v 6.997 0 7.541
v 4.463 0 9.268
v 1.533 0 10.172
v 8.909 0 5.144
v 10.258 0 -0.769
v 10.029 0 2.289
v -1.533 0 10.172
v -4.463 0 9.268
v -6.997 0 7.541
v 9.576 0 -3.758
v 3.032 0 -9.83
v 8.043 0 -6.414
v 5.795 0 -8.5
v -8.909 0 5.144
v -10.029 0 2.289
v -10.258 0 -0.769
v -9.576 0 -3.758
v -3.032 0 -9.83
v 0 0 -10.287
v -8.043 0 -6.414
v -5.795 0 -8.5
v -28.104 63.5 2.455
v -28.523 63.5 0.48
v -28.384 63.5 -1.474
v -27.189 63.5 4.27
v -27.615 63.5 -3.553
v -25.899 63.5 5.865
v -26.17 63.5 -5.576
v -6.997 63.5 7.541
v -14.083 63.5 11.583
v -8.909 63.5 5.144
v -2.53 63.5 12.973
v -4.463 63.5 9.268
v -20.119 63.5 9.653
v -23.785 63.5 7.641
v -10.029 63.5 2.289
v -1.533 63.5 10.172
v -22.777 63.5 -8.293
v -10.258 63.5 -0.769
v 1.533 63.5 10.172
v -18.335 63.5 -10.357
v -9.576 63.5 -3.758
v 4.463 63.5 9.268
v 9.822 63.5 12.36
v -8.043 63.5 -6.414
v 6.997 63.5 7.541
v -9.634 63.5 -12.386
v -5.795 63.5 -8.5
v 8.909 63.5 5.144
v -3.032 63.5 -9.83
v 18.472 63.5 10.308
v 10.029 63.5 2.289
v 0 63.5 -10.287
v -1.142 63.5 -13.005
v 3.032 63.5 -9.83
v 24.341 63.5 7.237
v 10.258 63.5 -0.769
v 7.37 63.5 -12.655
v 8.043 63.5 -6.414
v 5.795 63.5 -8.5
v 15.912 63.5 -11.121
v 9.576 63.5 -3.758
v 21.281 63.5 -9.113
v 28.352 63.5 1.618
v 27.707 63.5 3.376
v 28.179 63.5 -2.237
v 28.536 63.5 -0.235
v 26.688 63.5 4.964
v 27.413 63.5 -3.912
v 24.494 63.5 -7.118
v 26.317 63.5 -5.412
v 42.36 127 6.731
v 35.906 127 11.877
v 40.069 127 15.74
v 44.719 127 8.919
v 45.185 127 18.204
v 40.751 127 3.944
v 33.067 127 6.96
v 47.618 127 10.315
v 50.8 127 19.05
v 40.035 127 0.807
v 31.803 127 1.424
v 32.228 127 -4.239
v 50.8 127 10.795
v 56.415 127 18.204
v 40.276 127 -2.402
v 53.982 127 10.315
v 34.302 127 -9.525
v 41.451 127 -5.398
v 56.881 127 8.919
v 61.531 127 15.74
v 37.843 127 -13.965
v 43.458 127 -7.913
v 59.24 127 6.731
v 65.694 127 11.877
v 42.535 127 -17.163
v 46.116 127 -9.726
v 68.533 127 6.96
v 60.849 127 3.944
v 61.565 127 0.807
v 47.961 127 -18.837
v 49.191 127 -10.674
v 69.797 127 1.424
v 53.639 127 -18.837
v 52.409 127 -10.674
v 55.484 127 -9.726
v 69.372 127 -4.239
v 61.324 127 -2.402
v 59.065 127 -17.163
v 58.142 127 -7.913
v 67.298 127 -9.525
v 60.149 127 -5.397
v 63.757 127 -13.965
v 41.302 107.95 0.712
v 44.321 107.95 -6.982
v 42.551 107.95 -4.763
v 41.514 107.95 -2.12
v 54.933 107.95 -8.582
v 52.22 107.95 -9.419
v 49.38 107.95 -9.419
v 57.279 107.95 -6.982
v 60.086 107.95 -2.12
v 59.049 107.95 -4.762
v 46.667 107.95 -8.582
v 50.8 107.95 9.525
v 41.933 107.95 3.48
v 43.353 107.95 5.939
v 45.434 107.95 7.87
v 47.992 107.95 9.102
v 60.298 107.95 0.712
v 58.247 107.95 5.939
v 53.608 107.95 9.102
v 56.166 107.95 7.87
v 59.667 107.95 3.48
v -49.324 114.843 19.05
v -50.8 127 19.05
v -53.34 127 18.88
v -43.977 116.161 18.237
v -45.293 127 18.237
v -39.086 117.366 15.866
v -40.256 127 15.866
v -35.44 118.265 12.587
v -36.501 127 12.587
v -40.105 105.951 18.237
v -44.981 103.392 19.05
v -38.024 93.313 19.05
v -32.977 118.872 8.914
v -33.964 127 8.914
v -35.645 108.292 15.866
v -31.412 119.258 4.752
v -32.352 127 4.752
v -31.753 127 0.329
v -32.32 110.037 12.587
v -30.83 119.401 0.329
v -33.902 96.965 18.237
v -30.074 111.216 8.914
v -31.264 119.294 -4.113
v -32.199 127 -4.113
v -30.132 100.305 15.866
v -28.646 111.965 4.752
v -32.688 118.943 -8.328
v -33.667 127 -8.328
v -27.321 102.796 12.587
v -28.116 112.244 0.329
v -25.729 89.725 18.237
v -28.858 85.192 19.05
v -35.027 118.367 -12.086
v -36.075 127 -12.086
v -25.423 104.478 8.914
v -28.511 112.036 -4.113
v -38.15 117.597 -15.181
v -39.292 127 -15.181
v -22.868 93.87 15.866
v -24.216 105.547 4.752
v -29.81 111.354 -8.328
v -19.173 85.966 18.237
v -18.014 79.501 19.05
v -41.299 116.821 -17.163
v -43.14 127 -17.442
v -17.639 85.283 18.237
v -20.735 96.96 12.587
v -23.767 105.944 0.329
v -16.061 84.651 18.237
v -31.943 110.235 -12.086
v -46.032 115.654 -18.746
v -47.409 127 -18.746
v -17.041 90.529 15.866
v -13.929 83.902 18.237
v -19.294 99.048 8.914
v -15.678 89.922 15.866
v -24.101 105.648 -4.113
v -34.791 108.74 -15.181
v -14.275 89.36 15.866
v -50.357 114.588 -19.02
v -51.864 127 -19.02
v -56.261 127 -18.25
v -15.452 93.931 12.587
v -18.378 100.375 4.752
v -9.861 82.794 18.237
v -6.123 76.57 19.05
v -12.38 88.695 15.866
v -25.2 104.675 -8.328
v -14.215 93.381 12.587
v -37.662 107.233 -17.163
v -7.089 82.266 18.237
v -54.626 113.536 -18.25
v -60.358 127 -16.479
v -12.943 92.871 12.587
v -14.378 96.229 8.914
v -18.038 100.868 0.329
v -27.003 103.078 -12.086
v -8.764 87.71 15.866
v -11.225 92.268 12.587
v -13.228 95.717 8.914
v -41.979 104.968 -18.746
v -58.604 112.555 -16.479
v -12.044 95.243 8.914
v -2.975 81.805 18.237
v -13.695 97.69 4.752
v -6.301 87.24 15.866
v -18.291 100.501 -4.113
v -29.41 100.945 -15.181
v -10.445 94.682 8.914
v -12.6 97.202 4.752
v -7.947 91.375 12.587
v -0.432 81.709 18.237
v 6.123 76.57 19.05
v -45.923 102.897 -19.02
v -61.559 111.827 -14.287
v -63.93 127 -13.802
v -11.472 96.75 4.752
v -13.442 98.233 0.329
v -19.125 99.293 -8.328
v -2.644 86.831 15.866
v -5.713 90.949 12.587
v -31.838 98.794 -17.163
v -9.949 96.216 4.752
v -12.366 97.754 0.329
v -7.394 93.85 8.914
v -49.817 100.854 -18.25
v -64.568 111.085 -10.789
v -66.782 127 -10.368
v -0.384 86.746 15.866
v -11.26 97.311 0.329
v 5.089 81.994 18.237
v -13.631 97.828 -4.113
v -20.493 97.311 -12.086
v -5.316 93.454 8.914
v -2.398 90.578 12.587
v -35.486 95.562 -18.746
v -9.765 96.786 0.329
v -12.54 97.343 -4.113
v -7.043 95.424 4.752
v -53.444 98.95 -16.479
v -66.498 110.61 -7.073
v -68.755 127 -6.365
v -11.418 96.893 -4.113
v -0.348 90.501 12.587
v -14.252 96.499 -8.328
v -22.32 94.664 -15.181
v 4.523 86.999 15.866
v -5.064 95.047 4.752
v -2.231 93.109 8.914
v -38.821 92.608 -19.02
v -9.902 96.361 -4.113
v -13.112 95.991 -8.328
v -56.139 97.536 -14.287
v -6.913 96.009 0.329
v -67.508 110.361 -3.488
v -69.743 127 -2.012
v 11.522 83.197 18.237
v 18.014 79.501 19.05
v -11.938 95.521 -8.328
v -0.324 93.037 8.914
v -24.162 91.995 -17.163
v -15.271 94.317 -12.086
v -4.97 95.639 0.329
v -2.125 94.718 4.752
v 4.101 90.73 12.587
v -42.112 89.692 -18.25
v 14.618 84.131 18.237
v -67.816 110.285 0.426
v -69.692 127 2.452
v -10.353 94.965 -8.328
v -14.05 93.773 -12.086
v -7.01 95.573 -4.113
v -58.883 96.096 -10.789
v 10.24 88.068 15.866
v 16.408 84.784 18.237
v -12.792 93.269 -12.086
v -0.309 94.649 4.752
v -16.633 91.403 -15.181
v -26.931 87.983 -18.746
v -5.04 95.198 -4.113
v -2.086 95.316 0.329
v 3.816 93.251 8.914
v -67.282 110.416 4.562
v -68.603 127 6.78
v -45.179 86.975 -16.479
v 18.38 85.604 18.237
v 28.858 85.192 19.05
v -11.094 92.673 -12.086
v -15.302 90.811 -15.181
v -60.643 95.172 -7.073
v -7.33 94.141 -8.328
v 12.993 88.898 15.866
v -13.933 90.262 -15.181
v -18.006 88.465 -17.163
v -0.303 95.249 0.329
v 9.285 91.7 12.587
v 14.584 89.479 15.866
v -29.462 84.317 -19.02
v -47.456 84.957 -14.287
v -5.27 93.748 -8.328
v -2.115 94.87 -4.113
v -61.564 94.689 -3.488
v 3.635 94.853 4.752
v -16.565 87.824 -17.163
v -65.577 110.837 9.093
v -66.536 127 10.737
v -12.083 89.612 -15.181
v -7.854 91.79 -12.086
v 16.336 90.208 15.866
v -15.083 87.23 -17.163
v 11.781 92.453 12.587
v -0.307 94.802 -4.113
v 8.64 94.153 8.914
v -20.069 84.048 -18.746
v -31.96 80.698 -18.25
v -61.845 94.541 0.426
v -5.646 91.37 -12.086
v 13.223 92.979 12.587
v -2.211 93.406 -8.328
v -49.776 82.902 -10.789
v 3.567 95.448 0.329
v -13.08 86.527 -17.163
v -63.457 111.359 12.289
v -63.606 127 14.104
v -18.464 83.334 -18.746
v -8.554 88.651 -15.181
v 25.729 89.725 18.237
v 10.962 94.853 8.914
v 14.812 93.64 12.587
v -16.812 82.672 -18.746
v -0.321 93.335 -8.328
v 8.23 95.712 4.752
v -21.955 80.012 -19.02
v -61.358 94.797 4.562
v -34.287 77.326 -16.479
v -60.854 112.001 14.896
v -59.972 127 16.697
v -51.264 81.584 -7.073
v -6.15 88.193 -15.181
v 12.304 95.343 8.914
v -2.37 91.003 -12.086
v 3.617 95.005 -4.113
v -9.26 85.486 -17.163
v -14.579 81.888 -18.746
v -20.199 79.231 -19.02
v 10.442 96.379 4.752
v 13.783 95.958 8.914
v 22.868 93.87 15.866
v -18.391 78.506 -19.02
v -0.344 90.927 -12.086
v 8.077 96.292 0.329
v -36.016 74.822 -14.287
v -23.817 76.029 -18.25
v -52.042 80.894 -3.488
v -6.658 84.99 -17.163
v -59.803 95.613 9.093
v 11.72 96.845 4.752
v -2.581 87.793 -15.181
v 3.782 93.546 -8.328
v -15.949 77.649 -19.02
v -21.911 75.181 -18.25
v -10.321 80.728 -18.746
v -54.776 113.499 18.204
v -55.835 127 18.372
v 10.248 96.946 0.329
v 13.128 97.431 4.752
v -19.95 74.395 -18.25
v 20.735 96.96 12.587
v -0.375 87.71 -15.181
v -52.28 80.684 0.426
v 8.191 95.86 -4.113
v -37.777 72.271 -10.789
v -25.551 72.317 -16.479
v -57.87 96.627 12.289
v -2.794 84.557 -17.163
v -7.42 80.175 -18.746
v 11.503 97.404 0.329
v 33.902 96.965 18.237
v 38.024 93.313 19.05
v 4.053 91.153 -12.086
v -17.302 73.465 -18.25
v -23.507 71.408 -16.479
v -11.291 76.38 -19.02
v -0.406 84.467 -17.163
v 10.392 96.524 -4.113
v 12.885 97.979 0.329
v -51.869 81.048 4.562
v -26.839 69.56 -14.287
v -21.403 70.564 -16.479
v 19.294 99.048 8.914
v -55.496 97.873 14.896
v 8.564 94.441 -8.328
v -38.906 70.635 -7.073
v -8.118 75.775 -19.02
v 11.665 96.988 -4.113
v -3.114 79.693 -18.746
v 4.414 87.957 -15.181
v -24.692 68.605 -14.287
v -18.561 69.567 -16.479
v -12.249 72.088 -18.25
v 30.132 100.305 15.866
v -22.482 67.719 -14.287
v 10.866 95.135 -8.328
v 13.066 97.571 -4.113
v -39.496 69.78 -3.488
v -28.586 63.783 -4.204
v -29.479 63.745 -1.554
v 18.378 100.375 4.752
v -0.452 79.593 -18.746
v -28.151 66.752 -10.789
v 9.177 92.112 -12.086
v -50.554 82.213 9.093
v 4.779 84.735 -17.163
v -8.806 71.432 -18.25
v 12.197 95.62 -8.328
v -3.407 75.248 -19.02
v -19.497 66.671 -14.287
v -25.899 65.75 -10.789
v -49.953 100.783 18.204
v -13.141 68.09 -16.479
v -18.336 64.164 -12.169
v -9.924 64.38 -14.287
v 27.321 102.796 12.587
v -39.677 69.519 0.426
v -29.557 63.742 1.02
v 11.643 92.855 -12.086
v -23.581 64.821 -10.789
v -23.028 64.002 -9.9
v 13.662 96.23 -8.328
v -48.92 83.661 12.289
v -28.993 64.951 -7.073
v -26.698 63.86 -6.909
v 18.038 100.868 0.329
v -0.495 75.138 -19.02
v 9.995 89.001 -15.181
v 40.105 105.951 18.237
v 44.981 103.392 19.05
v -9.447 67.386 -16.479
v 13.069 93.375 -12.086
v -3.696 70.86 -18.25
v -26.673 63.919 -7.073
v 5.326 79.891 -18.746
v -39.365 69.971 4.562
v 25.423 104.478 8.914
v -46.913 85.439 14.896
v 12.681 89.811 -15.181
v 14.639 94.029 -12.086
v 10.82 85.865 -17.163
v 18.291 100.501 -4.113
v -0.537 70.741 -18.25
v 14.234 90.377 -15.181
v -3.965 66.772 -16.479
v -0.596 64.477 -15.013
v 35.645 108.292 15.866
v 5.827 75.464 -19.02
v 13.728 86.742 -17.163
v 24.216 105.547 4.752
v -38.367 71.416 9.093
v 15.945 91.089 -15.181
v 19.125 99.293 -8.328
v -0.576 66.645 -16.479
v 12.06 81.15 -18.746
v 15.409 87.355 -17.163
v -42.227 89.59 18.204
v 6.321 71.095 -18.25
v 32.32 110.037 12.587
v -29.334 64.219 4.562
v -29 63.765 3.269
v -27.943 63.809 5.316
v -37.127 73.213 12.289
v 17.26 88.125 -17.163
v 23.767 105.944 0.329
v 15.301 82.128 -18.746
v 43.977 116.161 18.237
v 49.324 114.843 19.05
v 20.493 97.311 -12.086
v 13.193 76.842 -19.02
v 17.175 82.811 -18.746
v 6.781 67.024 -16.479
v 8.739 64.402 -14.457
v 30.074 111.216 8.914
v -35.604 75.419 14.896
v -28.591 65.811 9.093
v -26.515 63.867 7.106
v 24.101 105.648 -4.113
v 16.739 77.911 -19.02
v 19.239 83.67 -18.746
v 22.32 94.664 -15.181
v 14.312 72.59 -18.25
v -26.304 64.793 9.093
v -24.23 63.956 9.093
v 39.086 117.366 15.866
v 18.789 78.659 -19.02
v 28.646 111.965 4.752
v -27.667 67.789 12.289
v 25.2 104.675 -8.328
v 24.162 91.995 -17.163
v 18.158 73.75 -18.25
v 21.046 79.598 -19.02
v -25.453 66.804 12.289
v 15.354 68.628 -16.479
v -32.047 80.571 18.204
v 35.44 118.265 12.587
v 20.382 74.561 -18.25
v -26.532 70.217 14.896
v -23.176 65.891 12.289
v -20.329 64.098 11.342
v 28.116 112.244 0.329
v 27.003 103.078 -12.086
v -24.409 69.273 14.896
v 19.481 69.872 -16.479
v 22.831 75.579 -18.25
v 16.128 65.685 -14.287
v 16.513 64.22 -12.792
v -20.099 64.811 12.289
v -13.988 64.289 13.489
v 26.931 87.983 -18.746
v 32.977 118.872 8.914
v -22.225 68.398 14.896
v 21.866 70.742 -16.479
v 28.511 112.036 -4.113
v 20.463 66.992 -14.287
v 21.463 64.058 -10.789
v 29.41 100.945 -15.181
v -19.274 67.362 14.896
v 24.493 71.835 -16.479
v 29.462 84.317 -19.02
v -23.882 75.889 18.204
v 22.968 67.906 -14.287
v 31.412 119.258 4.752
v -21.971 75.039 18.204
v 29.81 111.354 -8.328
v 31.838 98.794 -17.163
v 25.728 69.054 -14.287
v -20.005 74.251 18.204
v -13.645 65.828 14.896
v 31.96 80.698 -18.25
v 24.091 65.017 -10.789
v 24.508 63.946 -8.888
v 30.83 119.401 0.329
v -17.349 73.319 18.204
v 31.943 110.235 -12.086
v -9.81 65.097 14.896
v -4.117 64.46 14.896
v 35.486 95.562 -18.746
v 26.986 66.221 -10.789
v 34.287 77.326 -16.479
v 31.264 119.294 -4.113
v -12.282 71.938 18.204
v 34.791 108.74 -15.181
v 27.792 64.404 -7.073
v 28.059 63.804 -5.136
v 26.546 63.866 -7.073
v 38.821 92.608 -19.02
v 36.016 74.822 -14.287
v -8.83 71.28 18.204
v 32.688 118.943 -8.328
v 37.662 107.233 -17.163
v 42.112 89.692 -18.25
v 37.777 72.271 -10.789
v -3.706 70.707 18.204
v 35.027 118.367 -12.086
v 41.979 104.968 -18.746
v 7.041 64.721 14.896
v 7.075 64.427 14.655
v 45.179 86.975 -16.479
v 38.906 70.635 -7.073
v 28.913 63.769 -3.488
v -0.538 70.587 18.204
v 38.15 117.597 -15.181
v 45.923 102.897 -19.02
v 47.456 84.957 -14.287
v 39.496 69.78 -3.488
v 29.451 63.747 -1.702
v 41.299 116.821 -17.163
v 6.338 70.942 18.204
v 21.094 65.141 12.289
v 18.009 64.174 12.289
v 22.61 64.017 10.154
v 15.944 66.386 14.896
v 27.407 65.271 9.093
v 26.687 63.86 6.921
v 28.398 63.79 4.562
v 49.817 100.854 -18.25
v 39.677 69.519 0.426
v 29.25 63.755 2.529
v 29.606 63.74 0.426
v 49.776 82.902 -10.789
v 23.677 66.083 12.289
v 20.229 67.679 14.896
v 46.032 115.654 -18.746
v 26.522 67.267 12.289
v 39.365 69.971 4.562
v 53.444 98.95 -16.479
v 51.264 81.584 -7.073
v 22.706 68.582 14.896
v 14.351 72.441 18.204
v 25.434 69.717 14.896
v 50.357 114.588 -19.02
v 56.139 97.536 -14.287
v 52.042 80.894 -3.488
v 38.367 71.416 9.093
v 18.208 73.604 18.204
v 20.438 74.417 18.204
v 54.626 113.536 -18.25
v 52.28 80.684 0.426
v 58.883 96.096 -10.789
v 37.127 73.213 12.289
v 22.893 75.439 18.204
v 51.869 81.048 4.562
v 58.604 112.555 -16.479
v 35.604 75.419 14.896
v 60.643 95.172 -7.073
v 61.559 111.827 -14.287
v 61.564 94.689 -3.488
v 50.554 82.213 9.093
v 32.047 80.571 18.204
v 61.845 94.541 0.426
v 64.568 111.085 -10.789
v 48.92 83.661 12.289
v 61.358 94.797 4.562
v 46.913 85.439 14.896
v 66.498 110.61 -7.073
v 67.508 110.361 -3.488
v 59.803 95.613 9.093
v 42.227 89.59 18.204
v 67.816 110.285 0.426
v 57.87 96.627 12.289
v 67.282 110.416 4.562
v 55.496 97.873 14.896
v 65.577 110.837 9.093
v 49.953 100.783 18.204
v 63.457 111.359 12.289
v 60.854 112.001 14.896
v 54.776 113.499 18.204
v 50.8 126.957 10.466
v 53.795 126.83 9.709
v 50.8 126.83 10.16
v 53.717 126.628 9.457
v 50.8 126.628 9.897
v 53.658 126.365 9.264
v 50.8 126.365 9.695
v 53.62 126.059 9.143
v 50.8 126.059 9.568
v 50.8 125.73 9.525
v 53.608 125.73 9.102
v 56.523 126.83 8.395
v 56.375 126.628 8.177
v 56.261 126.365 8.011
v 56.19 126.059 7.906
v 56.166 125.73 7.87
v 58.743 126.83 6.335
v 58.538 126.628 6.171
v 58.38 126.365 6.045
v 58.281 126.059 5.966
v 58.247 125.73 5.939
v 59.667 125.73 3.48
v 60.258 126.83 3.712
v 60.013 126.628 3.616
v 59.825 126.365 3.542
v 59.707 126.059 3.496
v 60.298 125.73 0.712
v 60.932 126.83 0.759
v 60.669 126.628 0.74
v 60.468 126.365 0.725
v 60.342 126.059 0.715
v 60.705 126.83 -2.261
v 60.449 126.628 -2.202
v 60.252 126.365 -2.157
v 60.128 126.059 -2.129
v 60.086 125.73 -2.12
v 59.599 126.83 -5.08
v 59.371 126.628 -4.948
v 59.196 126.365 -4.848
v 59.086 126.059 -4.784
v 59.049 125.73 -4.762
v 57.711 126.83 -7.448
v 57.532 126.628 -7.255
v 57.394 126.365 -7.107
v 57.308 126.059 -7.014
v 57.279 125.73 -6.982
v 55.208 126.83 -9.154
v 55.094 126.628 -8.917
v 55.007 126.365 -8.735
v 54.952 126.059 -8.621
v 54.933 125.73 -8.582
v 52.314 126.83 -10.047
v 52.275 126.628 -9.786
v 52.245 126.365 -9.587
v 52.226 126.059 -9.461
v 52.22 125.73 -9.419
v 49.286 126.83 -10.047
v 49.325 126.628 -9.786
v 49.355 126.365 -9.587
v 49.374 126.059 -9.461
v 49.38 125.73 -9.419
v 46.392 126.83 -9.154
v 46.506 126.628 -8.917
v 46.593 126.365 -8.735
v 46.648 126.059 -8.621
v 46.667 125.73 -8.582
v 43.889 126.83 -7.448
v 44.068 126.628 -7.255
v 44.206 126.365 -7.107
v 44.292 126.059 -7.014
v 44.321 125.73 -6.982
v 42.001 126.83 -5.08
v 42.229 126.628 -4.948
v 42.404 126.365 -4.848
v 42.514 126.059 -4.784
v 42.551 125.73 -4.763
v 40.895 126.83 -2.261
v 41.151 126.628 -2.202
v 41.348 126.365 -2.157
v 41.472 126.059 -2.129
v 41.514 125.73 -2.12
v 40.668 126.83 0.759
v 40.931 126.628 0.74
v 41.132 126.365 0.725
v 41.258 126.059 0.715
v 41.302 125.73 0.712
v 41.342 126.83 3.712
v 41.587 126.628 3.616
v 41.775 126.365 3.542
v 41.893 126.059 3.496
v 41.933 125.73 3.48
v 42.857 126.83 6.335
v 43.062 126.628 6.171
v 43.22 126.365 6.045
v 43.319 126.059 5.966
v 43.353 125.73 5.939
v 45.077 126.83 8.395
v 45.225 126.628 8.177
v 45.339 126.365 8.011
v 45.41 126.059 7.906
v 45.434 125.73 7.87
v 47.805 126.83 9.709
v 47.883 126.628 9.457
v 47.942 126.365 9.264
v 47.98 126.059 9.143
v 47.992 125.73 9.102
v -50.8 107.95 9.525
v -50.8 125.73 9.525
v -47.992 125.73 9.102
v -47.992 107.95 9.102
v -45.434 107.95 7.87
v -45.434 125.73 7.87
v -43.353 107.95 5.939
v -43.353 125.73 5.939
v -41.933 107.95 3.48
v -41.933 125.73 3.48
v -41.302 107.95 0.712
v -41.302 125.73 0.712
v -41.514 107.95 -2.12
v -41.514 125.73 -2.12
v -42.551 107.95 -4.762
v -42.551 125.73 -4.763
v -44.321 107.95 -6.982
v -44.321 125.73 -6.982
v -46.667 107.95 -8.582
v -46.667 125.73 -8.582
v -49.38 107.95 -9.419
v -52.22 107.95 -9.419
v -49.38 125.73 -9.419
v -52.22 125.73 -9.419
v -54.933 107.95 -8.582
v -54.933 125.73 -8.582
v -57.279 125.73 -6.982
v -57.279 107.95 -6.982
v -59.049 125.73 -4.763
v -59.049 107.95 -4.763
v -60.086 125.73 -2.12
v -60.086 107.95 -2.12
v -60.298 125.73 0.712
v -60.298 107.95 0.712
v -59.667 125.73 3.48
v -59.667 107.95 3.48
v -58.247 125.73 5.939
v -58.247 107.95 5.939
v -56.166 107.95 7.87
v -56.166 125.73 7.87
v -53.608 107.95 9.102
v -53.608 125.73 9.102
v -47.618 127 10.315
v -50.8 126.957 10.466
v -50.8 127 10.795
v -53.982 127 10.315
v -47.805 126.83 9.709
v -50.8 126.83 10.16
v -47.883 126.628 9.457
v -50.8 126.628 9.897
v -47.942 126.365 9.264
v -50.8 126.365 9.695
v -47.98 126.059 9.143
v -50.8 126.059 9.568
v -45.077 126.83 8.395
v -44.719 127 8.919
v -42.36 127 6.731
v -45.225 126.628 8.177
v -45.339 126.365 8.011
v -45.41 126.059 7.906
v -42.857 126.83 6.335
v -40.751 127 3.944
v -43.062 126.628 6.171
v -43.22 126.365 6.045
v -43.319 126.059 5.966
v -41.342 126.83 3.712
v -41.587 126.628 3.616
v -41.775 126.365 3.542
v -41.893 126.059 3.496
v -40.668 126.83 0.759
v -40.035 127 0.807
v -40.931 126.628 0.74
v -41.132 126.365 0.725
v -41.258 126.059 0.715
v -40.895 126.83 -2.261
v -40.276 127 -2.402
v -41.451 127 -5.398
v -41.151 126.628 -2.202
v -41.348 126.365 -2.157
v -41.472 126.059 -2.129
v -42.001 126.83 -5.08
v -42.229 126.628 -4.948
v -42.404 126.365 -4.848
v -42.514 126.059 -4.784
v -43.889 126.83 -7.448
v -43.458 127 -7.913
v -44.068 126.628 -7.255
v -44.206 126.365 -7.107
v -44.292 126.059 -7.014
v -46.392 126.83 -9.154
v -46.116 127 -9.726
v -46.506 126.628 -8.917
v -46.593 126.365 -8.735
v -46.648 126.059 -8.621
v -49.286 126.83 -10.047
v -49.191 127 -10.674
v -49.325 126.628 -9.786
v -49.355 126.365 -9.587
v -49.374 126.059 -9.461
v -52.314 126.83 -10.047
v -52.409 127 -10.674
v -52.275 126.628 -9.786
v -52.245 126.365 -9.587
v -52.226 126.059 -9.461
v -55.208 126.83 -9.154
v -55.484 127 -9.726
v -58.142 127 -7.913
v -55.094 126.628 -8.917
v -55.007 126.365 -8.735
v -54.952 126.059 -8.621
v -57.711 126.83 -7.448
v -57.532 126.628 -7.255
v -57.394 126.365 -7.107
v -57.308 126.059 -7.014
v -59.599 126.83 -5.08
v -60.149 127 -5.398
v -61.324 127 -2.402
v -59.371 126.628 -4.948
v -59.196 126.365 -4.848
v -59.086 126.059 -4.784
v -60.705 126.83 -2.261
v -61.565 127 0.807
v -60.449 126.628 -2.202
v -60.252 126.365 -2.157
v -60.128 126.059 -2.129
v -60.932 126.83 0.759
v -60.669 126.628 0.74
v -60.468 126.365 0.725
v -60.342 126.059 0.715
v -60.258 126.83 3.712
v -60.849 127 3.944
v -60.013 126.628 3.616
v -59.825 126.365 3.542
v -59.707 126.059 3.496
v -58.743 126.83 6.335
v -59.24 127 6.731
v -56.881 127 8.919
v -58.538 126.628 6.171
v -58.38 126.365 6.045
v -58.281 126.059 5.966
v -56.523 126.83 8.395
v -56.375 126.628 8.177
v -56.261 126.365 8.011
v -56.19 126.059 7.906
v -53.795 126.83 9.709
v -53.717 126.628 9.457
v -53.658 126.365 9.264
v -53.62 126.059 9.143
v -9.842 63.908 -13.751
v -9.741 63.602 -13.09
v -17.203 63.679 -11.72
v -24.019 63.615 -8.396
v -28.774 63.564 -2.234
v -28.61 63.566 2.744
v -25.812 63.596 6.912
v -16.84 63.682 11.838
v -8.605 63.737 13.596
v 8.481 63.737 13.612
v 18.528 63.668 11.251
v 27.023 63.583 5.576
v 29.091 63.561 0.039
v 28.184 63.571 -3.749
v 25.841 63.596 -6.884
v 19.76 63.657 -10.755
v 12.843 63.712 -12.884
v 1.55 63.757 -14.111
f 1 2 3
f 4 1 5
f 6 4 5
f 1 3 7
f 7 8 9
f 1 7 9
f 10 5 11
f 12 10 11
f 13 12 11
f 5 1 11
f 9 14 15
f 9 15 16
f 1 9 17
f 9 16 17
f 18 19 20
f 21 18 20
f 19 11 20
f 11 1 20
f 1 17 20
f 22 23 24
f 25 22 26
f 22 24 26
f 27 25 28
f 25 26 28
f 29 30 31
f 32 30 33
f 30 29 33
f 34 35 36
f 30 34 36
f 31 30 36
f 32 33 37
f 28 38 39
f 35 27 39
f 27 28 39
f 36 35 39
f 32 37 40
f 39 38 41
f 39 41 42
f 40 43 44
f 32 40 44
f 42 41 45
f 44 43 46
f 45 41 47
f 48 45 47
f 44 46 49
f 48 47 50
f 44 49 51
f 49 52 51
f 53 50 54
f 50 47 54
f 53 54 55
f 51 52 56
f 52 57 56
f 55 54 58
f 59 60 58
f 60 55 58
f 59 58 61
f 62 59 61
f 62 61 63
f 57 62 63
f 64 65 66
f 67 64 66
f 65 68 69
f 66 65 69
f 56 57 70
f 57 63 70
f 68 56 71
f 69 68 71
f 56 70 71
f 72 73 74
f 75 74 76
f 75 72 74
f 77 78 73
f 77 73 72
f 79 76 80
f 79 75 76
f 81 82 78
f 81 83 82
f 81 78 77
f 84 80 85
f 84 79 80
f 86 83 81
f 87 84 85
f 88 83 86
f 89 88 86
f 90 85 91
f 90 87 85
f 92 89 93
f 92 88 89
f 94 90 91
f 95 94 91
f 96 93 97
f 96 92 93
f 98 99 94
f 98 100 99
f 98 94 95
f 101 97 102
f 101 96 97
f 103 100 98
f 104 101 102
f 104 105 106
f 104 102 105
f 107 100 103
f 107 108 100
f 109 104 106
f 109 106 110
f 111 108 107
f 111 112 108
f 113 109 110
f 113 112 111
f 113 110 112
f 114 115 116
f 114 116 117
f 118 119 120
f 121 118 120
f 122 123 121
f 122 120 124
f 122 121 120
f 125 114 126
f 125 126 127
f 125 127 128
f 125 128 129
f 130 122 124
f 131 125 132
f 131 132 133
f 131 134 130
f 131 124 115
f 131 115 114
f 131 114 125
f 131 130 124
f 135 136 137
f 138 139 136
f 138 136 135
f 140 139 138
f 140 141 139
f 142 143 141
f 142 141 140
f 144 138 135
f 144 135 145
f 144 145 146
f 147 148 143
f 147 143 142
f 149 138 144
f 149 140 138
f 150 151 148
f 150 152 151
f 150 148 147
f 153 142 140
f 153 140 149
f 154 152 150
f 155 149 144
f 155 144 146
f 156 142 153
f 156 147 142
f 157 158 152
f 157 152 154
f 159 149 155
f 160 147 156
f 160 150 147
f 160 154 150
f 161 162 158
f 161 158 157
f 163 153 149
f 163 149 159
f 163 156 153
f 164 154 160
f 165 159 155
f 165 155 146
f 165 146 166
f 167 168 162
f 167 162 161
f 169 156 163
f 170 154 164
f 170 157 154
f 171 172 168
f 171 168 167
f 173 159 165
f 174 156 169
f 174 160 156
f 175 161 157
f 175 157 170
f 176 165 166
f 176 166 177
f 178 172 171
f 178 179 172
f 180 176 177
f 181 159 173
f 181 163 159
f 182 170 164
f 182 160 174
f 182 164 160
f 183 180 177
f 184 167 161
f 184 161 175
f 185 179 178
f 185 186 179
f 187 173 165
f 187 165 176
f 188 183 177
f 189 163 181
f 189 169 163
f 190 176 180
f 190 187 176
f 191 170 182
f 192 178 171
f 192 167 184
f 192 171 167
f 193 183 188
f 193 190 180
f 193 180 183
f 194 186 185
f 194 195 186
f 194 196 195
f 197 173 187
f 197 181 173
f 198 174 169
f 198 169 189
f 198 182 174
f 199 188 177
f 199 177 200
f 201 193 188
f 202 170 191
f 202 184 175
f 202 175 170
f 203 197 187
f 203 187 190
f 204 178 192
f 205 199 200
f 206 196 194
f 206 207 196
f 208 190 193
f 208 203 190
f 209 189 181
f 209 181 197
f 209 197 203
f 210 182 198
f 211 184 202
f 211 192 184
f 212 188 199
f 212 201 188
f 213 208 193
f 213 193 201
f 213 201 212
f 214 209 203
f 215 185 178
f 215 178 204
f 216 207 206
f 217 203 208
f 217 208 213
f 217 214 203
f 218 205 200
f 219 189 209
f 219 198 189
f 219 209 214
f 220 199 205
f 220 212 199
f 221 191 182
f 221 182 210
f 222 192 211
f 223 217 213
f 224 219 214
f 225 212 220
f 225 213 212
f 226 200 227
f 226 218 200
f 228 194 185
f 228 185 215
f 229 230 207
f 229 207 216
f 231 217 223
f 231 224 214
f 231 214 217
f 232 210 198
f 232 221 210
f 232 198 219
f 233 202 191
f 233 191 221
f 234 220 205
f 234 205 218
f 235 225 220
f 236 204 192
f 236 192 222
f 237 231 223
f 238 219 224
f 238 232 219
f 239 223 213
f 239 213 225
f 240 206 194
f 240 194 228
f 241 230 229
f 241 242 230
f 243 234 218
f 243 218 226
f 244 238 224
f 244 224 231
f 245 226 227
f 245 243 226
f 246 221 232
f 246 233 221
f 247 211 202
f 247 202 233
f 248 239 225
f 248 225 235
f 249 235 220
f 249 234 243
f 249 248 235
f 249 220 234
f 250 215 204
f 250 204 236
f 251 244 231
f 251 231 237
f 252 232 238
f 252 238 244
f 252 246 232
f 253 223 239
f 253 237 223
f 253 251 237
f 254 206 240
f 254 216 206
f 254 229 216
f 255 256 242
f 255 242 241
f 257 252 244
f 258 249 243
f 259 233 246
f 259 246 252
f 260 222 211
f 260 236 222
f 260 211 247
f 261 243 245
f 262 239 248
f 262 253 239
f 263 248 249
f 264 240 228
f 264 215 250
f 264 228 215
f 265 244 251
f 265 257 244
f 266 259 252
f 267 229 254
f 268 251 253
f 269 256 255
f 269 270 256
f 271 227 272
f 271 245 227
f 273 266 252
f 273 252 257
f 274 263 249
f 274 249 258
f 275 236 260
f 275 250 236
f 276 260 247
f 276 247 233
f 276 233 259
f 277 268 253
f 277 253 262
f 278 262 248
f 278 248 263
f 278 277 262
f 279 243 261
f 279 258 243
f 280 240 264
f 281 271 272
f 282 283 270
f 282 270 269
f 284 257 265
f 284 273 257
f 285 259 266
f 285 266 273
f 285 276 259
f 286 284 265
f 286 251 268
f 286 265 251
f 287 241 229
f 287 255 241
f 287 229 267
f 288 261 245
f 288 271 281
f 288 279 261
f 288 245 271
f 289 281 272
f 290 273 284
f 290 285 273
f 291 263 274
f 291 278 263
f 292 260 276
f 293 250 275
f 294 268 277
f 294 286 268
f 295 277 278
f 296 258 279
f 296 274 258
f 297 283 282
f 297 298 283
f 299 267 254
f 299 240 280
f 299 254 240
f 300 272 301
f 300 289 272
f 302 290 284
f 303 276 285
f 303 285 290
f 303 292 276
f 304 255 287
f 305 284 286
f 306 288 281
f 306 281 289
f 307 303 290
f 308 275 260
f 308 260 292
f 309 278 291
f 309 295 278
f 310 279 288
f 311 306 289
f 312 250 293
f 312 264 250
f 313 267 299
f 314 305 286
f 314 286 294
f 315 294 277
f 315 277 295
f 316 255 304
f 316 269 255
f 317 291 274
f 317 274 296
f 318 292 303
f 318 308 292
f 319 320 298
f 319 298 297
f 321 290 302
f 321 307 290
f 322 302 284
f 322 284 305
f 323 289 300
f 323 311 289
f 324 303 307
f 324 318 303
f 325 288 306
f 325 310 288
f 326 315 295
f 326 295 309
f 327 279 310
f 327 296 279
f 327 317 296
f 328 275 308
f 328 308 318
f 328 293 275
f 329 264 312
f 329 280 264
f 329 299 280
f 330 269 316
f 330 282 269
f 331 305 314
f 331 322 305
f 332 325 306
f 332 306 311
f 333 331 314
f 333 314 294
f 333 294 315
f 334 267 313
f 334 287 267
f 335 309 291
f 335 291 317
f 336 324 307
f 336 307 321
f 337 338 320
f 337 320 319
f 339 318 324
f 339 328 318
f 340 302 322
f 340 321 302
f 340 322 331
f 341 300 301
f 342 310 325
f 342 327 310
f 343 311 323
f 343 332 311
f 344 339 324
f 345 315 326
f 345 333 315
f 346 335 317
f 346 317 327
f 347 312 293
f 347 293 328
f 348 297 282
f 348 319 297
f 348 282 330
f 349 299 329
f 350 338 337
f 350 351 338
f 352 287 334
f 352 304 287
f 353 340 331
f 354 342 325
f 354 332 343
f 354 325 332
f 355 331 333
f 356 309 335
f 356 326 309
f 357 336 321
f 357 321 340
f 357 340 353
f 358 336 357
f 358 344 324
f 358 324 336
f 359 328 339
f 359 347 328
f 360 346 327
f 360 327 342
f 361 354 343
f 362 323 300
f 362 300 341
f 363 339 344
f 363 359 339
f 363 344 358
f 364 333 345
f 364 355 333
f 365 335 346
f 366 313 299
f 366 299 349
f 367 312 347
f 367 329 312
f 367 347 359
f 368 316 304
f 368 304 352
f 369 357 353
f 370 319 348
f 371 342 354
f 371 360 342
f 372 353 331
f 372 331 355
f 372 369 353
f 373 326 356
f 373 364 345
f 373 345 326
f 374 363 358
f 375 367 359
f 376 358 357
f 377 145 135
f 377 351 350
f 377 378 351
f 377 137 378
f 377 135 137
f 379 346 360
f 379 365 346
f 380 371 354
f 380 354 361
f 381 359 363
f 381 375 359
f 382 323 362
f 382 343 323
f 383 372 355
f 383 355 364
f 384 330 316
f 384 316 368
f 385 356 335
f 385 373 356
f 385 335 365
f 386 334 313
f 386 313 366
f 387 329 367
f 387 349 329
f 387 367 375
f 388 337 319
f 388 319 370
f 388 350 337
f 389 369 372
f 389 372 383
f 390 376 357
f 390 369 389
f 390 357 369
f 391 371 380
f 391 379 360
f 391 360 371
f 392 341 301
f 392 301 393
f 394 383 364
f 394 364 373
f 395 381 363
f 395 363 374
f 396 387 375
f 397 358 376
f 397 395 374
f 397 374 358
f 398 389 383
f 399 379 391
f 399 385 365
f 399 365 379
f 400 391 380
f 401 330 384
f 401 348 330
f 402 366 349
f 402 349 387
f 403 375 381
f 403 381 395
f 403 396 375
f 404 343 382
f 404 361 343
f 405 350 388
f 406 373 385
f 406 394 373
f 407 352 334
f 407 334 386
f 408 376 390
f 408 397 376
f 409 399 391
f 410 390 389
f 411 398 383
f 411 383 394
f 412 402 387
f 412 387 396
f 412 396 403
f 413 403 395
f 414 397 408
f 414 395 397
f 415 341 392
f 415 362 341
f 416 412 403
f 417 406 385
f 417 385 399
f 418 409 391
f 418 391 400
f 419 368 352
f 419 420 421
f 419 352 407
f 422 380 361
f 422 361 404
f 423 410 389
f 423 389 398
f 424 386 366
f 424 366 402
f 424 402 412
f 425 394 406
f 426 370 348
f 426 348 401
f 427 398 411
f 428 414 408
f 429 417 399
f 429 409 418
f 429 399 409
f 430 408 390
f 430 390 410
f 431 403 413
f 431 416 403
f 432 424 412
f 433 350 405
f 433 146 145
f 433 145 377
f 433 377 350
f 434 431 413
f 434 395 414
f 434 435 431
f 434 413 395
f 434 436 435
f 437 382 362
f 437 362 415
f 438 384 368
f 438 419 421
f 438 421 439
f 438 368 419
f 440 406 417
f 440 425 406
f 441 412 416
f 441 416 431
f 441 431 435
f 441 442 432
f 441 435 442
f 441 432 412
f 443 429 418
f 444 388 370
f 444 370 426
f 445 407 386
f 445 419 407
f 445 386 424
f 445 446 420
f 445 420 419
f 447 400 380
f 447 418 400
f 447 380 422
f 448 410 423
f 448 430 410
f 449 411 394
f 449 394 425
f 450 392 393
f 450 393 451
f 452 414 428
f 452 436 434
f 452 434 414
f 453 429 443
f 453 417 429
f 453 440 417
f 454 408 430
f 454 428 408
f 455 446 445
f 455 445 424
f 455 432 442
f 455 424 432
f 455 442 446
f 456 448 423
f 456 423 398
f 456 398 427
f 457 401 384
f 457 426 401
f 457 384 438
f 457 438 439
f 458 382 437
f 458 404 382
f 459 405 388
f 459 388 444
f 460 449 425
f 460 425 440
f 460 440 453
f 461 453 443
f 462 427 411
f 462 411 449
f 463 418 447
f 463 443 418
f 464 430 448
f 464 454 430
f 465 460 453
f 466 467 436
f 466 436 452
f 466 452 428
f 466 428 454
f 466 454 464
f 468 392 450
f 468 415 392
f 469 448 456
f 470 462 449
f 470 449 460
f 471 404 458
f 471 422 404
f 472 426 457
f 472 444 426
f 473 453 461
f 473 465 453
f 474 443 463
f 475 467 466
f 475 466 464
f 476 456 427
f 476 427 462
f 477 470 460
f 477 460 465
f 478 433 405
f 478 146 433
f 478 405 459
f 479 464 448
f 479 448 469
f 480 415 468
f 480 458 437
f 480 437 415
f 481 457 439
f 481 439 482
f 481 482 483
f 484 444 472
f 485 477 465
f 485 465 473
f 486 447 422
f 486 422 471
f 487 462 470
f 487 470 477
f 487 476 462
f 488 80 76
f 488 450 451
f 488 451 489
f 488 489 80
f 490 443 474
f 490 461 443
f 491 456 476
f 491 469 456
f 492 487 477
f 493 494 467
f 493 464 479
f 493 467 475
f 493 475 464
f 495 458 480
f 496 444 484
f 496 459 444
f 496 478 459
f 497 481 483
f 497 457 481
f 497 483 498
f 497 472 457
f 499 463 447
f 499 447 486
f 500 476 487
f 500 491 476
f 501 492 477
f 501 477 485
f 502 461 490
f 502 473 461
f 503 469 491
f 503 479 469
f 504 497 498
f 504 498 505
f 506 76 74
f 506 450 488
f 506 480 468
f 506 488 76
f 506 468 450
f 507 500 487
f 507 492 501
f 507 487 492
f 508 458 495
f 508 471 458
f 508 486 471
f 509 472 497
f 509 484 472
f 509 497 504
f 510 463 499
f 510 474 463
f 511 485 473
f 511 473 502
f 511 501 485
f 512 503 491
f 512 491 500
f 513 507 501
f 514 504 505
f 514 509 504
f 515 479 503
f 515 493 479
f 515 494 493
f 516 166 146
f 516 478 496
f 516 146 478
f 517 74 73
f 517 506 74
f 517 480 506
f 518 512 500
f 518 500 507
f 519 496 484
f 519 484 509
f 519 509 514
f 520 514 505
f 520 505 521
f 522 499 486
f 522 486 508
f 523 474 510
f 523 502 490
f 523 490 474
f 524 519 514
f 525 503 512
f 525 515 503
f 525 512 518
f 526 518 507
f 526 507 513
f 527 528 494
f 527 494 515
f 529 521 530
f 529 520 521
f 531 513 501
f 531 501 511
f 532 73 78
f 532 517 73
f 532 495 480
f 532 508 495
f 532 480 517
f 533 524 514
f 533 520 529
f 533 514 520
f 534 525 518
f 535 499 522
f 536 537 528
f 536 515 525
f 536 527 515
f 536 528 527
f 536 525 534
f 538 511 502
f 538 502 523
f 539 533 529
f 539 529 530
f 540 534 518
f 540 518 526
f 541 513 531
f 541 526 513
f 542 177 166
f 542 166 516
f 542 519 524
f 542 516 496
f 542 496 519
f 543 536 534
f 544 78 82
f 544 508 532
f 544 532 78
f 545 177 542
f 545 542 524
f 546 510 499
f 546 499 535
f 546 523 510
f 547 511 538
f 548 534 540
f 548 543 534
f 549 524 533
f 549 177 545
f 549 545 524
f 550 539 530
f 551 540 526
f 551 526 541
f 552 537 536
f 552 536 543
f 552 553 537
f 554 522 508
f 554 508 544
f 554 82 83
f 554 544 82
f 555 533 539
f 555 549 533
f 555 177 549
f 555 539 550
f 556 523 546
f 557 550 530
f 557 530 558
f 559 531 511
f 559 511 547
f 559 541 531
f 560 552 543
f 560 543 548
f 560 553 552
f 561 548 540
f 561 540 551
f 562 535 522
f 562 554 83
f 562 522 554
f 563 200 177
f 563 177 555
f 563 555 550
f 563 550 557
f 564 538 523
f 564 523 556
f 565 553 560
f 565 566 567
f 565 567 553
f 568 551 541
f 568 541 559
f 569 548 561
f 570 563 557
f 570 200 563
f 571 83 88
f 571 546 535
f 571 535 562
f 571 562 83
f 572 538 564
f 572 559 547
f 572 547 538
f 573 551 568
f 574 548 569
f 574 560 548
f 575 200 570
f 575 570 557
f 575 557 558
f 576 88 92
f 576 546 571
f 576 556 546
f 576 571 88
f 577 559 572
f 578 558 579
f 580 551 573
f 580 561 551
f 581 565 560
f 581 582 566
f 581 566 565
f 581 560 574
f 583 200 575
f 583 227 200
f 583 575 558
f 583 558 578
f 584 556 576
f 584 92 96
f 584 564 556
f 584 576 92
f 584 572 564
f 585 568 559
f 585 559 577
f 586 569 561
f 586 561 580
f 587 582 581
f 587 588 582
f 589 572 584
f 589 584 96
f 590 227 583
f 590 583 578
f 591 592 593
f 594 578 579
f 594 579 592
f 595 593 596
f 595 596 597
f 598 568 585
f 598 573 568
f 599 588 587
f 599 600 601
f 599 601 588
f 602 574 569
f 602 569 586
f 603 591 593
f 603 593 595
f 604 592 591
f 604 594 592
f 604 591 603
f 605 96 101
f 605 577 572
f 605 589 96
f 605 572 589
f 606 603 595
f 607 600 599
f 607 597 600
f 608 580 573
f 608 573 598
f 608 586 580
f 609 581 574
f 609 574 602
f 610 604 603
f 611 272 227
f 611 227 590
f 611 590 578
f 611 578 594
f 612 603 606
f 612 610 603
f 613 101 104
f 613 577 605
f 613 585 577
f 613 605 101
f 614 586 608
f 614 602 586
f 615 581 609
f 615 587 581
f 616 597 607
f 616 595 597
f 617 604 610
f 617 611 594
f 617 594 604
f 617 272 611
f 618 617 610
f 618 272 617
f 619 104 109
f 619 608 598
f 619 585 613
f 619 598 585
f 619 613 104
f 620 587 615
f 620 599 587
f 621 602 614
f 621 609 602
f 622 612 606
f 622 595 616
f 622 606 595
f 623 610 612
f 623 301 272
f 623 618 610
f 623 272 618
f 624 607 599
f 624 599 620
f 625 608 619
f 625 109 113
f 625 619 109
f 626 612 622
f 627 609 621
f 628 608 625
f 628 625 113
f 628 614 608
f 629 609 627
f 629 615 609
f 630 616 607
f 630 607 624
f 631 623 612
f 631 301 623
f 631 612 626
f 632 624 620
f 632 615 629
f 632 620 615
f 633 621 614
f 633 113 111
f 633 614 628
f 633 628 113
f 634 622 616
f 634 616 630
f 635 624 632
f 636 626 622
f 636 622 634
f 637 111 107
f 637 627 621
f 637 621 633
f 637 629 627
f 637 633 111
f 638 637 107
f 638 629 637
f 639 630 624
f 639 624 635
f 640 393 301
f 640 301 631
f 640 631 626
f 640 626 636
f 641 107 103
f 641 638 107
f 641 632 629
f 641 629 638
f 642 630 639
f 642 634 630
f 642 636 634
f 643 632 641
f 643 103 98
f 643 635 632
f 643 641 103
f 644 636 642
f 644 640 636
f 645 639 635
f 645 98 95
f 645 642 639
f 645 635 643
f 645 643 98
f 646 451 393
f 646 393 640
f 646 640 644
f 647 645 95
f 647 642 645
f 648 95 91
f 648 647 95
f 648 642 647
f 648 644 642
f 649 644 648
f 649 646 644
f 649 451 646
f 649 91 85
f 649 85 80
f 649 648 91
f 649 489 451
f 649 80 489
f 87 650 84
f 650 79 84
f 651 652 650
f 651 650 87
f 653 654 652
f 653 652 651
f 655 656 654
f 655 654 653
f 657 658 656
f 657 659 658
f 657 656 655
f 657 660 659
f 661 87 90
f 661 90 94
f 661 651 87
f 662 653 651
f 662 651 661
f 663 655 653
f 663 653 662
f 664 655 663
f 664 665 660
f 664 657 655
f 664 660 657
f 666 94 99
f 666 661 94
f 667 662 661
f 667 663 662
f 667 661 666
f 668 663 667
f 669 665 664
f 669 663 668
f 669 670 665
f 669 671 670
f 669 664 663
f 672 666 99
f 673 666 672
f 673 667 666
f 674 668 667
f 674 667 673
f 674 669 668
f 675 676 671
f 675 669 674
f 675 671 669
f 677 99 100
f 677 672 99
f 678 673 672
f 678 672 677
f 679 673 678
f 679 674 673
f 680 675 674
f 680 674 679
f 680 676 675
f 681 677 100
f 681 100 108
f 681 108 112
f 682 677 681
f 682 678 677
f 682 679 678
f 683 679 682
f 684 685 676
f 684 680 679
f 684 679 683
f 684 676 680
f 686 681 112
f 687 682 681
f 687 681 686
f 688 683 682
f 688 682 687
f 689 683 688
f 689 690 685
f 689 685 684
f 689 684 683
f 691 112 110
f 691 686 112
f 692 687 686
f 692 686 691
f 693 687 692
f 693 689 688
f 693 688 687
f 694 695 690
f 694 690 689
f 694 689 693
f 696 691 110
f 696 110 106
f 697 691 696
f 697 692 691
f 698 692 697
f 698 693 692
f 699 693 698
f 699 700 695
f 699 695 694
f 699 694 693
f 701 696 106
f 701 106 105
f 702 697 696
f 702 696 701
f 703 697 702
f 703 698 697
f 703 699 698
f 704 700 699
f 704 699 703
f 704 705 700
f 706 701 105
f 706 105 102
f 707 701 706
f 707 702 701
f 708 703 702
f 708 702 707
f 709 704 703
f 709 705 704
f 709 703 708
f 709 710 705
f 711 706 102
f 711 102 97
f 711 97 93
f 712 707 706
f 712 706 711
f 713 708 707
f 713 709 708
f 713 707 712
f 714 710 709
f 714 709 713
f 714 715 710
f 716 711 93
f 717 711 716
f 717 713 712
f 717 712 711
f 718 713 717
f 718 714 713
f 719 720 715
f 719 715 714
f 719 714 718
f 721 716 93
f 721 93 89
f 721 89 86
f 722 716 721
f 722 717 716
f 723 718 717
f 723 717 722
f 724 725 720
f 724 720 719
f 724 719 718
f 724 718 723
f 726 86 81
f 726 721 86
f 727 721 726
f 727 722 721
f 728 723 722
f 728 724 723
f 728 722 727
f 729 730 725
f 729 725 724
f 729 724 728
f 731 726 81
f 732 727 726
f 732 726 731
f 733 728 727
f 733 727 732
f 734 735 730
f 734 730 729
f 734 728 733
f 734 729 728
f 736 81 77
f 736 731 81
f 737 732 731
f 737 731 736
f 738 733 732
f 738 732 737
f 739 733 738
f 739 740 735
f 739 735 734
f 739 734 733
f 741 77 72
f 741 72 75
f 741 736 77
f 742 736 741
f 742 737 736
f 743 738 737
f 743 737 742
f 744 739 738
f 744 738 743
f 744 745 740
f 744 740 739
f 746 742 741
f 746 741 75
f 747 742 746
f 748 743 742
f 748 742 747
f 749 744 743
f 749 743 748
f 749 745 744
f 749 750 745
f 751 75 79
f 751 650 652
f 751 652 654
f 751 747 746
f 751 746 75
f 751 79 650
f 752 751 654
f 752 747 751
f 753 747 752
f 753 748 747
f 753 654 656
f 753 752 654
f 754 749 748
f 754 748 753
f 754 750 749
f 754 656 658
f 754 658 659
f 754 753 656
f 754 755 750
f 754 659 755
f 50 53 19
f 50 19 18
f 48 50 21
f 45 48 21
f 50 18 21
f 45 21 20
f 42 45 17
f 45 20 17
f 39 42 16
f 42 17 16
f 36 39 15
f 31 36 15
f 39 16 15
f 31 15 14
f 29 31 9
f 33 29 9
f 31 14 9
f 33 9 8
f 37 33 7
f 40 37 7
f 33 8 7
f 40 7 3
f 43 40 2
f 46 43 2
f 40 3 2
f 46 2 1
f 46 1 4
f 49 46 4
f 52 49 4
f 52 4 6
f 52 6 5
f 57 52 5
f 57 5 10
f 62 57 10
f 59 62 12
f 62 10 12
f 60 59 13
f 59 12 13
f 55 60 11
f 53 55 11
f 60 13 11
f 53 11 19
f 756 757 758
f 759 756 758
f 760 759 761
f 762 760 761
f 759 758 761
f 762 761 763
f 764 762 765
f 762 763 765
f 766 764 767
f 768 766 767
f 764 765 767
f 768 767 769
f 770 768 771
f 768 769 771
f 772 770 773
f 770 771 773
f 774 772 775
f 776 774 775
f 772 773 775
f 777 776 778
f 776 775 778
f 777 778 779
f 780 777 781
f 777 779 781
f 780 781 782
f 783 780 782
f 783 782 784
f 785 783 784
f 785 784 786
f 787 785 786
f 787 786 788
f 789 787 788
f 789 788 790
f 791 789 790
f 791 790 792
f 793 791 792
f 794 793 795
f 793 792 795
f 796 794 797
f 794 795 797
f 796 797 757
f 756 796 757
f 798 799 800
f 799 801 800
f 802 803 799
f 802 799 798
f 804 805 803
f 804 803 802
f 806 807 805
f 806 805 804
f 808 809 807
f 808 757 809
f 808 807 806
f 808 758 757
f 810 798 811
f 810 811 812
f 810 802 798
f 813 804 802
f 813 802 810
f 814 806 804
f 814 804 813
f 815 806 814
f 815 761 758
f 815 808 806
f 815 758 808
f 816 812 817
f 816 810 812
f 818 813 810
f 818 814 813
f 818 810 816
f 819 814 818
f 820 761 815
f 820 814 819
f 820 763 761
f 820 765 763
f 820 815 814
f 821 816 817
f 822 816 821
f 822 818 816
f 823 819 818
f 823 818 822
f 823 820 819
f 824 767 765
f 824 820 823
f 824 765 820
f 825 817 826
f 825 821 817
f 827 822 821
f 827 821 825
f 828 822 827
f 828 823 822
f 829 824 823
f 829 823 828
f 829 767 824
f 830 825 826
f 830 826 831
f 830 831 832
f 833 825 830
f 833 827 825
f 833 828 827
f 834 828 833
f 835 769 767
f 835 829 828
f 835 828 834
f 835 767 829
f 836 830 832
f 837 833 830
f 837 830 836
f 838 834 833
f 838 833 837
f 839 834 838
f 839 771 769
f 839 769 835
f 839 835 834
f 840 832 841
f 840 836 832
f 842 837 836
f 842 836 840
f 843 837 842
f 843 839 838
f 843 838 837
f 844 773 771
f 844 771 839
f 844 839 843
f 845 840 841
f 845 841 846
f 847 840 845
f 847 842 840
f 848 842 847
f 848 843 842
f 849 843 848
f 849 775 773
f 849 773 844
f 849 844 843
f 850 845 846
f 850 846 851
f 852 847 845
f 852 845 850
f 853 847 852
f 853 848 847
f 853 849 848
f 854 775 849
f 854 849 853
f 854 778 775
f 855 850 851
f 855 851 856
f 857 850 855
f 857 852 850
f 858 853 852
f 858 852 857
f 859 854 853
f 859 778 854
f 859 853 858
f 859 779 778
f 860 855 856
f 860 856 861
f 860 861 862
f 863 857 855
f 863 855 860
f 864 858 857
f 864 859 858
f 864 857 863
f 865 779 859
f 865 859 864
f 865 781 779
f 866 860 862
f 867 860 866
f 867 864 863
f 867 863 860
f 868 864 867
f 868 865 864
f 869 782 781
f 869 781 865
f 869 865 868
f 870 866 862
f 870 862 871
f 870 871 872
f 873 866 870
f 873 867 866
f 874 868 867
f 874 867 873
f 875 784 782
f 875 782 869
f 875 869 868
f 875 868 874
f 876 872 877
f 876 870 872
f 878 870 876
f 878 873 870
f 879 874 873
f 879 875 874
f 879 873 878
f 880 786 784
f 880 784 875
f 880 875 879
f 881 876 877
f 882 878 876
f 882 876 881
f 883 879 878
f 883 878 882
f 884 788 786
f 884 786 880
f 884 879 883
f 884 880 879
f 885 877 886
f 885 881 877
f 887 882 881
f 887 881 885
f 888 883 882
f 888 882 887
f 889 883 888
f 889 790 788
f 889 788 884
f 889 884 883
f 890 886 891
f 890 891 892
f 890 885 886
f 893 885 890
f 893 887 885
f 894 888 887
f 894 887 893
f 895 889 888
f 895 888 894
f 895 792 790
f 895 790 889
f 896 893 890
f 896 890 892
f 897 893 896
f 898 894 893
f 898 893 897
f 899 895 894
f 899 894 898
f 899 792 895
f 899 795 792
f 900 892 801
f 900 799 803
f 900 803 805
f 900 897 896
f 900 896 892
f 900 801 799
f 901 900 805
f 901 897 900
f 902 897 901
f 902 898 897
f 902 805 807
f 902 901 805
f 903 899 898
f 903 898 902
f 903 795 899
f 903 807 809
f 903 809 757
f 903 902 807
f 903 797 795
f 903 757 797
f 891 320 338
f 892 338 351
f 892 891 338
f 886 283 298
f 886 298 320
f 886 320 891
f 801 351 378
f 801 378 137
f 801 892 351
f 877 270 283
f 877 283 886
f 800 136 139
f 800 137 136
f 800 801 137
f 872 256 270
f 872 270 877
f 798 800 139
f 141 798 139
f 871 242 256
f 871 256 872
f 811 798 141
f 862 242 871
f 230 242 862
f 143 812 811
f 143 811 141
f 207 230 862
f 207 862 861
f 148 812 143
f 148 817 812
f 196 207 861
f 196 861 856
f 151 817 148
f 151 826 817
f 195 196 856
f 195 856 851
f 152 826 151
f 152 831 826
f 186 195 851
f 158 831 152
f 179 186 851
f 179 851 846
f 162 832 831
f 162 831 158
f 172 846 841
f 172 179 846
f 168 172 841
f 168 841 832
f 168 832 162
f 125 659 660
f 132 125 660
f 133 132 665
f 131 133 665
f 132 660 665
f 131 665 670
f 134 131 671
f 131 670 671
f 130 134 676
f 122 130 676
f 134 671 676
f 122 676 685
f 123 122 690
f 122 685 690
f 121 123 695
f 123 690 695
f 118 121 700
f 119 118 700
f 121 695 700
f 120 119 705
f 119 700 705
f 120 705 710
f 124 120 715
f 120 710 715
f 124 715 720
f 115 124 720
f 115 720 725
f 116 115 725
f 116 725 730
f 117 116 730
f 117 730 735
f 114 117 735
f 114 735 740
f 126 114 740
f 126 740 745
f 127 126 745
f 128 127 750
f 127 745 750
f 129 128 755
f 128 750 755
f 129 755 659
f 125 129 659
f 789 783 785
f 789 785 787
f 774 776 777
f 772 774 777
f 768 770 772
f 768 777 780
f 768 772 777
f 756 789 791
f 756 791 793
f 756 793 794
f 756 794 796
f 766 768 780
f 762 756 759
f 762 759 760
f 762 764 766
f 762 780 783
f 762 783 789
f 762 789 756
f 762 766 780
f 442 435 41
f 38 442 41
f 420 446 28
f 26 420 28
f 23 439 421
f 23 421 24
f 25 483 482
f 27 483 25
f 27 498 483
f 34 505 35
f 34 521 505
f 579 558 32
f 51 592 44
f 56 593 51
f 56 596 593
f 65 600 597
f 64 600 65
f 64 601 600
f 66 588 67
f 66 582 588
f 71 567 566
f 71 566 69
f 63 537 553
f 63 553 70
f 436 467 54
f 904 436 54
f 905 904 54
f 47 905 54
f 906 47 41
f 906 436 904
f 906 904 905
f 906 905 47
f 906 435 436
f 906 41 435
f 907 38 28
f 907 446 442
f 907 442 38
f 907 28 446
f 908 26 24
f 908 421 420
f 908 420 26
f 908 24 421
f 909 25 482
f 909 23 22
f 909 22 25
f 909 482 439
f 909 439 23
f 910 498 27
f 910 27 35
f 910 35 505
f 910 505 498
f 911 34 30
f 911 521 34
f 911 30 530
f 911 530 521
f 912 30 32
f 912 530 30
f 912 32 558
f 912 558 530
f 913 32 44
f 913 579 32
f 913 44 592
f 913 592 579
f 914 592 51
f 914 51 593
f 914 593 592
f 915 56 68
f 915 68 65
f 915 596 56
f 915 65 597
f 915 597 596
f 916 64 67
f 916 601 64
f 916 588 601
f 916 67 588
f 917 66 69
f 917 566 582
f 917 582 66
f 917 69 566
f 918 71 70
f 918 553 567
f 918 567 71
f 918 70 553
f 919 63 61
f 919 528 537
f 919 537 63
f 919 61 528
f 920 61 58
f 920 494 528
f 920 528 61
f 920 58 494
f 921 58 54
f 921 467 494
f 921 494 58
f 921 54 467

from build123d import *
from build123d.topology import SkipClean

# Parameters (mm, degrees)
SKETCH2_R               = 10.287
BOSS_EXTRUDE1_DEPTH     = 76.2
SWEEP1_PROFILE_R        = 19.05
SKETCH10_W              = 148.15790326
SKETCH10_H              = 49.47754936
SKETCH10_R              = 10.287
CUT_EXTRUDE1_DEPTH      = 63.5
FILLET1_R               = 2.54
CUT_EXTRUDE2_DEPTH      = 63.5
CUT_EXTRUDE2_DEPTH_BACK = 63.5
SKETCH11_W              = 184.531280221
SKETCH11_H              = 85.52478337
SKETCH12_R              = 9.525
CUT_EXTRUDE3_DEPTH      = 19.05
FILLET2_R               = 1.27


with BuildPart() as part:
    # Sketch2 → Boss-Extrude1 (new body)
    with BuildSketch(Plane(origin=(0, 0, 0), x_dir=(1, 0, 0), z_dir=(0, 1, 0))):
        Circle(SKETCH2_R)
    extrude(amount=BOSS_EXTRUDE1_DEPTH)

    # Sweep1: sweep along a path in Sketch3
    with SkipClean():  # the faces are left unmerged after this step: merging them gives an invalid solid
        with BuildLine(Plane.XY) as sweep1_path:
            CenterArc((0, 127), 50.8, 0, 360)
        # Sweep1 profile (on start of the path) → Sweep1 (sweep)
        with BuildSketch(Plane(origin=(50.8, 127, 0), x_dir=(0, 0, 1), z_dir=(0, 1, 0))):
            Circle(SWEEP1_PROFILE_R)
        sweep(path=sweep1_path.line)

    # Sketch10 → Cut-Extrude1 (cut)
    with BuildSketch(Plane(origin=(0, 0, 0), x_dir=(1, 0, 0), z_dir=(0, 1, 0))):
        Rectangle(SKETCH10_W, SKETCH10_H)
        Circle(SKETCH10_R, mode=Mode.SUBTRACT)
    extrude(amount=CUT_EXTRUDE1_DEPTH, mode=Mode.SUBTRACT)

    # Fillet1
    fillet1_edges = [part.edges().sort_by_distance(p)[0] for p in [
        (9.536798122, 63.5, 13.528365302),
    ]]
    fillet(fillet1_edges, radius=FILLET1_R)

    # Sketch11 → Cut-Extrude2 (cut, two sides: drawn at the far end of the back side and taken through both)
    with BuildSketch(Plane.XY.offset(-CUT_EXTRUDE2_DEPTH_BACK)):
        with Locations((2.628650716, 169.762391685)):
            Rectangle(SKETCH11_W, SKETCH11_H)
    extrude(amount=CUT_EXTRUDE2_DEPTH + CUT_EXTRUDE2_DEPTH_BACK, mode=Mode.SUBTRACT)

    # Sketch12 → Cut-Extrude3 (cut)
    with BuildSketch(Plane(origin=(0, 127, 0), x_dir=(1, 0, 0), z_dir=(0, 1, 0))):
        with Locations((50.8, 0)):
            Circle(SKETCH12_R)
        with Locations((-50.8, 0)):
            Circle(SKETCH12_R)
    extrude(amount=-CUT_EXTRUDE3_DEPTH, mode=Mode.SUBTRACT)

    # Fillet2
    fillet2_edges = [part.edges().sort_by_distance(p)[0] for p in [
        (41.275, 127, 0),
        (-60.325, 127, 0),
    ]]
    fillet(fillet2_edges, radius=FILLET2_R)


solid = part.part
